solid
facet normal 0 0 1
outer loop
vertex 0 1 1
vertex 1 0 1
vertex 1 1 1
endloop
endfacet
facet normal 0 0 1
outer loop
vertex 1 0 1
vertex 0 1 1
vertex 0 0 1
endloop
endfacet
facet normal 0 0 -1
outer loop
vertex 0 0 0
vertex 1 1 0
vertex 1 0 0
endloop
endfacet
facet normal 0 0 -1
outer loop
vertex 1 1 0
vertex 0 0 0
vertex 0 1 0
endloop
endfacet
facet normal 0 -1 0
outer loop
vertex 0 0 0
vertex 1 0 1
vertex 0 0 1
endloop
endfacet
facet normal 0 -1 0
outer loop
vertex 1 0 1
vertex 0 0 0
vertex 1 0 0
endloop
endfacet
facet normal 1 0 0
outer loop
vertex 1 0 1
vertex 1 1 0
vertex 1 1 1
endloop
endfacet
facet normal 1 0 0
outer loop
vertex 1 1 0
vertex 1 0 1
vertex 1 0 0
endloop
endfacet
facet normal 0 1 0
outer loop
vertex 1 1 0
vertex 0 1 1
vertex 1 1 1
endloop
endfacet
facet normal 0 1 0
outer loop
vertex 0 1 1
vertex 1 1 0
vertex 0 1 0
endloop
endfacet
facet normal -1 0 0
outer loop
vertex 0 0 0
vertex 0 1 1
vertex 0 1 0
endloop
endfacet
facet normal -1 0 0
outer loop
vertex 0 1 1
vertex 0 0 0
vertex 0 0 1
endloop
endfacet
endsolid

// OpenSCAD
cube(1);
echo(1 >= 1);
echo(1 >= 2);
echo(1 >= "1");
echo(1 >= "2");
echo("1" >= 1);
echo("1" >= 2);
echo("12" >= "12");
echo("a" >= "b");
echo("b" >= "a");

echo(1 >= true);
echo(0 >= true);
echo("a" >= true);

echo(true >= 0);
echo(false >= 0);
echo(true >= 1);
echo(false >= 1);
echo(true >= 2);
echo(false >= 2);

echo(0 >= true);
echo(0 >= false);
echo(1 >= true);
echo(1 >= false);
echo(2 >= true);
echo(2 >= false);

echo(true >= "a");

echo(true >= true);
echo(true >= false);
echo(false >= true);

echo([1] >= [1]);
echo([1,2] >= [1,2]);
echo([1,[2,3]] >= [1,[2,3]]);
echo([1] >= [2]);
echo([1,[2,3]] >= [1,[2,4]]);


echo(1 >= [1]);
echo(true >= [1]);
echo("1" >= [1]);

echo([1] >= 1);
echo([1] >= true);
echo([1] >= "1");

echo(1+4 >= 5);
